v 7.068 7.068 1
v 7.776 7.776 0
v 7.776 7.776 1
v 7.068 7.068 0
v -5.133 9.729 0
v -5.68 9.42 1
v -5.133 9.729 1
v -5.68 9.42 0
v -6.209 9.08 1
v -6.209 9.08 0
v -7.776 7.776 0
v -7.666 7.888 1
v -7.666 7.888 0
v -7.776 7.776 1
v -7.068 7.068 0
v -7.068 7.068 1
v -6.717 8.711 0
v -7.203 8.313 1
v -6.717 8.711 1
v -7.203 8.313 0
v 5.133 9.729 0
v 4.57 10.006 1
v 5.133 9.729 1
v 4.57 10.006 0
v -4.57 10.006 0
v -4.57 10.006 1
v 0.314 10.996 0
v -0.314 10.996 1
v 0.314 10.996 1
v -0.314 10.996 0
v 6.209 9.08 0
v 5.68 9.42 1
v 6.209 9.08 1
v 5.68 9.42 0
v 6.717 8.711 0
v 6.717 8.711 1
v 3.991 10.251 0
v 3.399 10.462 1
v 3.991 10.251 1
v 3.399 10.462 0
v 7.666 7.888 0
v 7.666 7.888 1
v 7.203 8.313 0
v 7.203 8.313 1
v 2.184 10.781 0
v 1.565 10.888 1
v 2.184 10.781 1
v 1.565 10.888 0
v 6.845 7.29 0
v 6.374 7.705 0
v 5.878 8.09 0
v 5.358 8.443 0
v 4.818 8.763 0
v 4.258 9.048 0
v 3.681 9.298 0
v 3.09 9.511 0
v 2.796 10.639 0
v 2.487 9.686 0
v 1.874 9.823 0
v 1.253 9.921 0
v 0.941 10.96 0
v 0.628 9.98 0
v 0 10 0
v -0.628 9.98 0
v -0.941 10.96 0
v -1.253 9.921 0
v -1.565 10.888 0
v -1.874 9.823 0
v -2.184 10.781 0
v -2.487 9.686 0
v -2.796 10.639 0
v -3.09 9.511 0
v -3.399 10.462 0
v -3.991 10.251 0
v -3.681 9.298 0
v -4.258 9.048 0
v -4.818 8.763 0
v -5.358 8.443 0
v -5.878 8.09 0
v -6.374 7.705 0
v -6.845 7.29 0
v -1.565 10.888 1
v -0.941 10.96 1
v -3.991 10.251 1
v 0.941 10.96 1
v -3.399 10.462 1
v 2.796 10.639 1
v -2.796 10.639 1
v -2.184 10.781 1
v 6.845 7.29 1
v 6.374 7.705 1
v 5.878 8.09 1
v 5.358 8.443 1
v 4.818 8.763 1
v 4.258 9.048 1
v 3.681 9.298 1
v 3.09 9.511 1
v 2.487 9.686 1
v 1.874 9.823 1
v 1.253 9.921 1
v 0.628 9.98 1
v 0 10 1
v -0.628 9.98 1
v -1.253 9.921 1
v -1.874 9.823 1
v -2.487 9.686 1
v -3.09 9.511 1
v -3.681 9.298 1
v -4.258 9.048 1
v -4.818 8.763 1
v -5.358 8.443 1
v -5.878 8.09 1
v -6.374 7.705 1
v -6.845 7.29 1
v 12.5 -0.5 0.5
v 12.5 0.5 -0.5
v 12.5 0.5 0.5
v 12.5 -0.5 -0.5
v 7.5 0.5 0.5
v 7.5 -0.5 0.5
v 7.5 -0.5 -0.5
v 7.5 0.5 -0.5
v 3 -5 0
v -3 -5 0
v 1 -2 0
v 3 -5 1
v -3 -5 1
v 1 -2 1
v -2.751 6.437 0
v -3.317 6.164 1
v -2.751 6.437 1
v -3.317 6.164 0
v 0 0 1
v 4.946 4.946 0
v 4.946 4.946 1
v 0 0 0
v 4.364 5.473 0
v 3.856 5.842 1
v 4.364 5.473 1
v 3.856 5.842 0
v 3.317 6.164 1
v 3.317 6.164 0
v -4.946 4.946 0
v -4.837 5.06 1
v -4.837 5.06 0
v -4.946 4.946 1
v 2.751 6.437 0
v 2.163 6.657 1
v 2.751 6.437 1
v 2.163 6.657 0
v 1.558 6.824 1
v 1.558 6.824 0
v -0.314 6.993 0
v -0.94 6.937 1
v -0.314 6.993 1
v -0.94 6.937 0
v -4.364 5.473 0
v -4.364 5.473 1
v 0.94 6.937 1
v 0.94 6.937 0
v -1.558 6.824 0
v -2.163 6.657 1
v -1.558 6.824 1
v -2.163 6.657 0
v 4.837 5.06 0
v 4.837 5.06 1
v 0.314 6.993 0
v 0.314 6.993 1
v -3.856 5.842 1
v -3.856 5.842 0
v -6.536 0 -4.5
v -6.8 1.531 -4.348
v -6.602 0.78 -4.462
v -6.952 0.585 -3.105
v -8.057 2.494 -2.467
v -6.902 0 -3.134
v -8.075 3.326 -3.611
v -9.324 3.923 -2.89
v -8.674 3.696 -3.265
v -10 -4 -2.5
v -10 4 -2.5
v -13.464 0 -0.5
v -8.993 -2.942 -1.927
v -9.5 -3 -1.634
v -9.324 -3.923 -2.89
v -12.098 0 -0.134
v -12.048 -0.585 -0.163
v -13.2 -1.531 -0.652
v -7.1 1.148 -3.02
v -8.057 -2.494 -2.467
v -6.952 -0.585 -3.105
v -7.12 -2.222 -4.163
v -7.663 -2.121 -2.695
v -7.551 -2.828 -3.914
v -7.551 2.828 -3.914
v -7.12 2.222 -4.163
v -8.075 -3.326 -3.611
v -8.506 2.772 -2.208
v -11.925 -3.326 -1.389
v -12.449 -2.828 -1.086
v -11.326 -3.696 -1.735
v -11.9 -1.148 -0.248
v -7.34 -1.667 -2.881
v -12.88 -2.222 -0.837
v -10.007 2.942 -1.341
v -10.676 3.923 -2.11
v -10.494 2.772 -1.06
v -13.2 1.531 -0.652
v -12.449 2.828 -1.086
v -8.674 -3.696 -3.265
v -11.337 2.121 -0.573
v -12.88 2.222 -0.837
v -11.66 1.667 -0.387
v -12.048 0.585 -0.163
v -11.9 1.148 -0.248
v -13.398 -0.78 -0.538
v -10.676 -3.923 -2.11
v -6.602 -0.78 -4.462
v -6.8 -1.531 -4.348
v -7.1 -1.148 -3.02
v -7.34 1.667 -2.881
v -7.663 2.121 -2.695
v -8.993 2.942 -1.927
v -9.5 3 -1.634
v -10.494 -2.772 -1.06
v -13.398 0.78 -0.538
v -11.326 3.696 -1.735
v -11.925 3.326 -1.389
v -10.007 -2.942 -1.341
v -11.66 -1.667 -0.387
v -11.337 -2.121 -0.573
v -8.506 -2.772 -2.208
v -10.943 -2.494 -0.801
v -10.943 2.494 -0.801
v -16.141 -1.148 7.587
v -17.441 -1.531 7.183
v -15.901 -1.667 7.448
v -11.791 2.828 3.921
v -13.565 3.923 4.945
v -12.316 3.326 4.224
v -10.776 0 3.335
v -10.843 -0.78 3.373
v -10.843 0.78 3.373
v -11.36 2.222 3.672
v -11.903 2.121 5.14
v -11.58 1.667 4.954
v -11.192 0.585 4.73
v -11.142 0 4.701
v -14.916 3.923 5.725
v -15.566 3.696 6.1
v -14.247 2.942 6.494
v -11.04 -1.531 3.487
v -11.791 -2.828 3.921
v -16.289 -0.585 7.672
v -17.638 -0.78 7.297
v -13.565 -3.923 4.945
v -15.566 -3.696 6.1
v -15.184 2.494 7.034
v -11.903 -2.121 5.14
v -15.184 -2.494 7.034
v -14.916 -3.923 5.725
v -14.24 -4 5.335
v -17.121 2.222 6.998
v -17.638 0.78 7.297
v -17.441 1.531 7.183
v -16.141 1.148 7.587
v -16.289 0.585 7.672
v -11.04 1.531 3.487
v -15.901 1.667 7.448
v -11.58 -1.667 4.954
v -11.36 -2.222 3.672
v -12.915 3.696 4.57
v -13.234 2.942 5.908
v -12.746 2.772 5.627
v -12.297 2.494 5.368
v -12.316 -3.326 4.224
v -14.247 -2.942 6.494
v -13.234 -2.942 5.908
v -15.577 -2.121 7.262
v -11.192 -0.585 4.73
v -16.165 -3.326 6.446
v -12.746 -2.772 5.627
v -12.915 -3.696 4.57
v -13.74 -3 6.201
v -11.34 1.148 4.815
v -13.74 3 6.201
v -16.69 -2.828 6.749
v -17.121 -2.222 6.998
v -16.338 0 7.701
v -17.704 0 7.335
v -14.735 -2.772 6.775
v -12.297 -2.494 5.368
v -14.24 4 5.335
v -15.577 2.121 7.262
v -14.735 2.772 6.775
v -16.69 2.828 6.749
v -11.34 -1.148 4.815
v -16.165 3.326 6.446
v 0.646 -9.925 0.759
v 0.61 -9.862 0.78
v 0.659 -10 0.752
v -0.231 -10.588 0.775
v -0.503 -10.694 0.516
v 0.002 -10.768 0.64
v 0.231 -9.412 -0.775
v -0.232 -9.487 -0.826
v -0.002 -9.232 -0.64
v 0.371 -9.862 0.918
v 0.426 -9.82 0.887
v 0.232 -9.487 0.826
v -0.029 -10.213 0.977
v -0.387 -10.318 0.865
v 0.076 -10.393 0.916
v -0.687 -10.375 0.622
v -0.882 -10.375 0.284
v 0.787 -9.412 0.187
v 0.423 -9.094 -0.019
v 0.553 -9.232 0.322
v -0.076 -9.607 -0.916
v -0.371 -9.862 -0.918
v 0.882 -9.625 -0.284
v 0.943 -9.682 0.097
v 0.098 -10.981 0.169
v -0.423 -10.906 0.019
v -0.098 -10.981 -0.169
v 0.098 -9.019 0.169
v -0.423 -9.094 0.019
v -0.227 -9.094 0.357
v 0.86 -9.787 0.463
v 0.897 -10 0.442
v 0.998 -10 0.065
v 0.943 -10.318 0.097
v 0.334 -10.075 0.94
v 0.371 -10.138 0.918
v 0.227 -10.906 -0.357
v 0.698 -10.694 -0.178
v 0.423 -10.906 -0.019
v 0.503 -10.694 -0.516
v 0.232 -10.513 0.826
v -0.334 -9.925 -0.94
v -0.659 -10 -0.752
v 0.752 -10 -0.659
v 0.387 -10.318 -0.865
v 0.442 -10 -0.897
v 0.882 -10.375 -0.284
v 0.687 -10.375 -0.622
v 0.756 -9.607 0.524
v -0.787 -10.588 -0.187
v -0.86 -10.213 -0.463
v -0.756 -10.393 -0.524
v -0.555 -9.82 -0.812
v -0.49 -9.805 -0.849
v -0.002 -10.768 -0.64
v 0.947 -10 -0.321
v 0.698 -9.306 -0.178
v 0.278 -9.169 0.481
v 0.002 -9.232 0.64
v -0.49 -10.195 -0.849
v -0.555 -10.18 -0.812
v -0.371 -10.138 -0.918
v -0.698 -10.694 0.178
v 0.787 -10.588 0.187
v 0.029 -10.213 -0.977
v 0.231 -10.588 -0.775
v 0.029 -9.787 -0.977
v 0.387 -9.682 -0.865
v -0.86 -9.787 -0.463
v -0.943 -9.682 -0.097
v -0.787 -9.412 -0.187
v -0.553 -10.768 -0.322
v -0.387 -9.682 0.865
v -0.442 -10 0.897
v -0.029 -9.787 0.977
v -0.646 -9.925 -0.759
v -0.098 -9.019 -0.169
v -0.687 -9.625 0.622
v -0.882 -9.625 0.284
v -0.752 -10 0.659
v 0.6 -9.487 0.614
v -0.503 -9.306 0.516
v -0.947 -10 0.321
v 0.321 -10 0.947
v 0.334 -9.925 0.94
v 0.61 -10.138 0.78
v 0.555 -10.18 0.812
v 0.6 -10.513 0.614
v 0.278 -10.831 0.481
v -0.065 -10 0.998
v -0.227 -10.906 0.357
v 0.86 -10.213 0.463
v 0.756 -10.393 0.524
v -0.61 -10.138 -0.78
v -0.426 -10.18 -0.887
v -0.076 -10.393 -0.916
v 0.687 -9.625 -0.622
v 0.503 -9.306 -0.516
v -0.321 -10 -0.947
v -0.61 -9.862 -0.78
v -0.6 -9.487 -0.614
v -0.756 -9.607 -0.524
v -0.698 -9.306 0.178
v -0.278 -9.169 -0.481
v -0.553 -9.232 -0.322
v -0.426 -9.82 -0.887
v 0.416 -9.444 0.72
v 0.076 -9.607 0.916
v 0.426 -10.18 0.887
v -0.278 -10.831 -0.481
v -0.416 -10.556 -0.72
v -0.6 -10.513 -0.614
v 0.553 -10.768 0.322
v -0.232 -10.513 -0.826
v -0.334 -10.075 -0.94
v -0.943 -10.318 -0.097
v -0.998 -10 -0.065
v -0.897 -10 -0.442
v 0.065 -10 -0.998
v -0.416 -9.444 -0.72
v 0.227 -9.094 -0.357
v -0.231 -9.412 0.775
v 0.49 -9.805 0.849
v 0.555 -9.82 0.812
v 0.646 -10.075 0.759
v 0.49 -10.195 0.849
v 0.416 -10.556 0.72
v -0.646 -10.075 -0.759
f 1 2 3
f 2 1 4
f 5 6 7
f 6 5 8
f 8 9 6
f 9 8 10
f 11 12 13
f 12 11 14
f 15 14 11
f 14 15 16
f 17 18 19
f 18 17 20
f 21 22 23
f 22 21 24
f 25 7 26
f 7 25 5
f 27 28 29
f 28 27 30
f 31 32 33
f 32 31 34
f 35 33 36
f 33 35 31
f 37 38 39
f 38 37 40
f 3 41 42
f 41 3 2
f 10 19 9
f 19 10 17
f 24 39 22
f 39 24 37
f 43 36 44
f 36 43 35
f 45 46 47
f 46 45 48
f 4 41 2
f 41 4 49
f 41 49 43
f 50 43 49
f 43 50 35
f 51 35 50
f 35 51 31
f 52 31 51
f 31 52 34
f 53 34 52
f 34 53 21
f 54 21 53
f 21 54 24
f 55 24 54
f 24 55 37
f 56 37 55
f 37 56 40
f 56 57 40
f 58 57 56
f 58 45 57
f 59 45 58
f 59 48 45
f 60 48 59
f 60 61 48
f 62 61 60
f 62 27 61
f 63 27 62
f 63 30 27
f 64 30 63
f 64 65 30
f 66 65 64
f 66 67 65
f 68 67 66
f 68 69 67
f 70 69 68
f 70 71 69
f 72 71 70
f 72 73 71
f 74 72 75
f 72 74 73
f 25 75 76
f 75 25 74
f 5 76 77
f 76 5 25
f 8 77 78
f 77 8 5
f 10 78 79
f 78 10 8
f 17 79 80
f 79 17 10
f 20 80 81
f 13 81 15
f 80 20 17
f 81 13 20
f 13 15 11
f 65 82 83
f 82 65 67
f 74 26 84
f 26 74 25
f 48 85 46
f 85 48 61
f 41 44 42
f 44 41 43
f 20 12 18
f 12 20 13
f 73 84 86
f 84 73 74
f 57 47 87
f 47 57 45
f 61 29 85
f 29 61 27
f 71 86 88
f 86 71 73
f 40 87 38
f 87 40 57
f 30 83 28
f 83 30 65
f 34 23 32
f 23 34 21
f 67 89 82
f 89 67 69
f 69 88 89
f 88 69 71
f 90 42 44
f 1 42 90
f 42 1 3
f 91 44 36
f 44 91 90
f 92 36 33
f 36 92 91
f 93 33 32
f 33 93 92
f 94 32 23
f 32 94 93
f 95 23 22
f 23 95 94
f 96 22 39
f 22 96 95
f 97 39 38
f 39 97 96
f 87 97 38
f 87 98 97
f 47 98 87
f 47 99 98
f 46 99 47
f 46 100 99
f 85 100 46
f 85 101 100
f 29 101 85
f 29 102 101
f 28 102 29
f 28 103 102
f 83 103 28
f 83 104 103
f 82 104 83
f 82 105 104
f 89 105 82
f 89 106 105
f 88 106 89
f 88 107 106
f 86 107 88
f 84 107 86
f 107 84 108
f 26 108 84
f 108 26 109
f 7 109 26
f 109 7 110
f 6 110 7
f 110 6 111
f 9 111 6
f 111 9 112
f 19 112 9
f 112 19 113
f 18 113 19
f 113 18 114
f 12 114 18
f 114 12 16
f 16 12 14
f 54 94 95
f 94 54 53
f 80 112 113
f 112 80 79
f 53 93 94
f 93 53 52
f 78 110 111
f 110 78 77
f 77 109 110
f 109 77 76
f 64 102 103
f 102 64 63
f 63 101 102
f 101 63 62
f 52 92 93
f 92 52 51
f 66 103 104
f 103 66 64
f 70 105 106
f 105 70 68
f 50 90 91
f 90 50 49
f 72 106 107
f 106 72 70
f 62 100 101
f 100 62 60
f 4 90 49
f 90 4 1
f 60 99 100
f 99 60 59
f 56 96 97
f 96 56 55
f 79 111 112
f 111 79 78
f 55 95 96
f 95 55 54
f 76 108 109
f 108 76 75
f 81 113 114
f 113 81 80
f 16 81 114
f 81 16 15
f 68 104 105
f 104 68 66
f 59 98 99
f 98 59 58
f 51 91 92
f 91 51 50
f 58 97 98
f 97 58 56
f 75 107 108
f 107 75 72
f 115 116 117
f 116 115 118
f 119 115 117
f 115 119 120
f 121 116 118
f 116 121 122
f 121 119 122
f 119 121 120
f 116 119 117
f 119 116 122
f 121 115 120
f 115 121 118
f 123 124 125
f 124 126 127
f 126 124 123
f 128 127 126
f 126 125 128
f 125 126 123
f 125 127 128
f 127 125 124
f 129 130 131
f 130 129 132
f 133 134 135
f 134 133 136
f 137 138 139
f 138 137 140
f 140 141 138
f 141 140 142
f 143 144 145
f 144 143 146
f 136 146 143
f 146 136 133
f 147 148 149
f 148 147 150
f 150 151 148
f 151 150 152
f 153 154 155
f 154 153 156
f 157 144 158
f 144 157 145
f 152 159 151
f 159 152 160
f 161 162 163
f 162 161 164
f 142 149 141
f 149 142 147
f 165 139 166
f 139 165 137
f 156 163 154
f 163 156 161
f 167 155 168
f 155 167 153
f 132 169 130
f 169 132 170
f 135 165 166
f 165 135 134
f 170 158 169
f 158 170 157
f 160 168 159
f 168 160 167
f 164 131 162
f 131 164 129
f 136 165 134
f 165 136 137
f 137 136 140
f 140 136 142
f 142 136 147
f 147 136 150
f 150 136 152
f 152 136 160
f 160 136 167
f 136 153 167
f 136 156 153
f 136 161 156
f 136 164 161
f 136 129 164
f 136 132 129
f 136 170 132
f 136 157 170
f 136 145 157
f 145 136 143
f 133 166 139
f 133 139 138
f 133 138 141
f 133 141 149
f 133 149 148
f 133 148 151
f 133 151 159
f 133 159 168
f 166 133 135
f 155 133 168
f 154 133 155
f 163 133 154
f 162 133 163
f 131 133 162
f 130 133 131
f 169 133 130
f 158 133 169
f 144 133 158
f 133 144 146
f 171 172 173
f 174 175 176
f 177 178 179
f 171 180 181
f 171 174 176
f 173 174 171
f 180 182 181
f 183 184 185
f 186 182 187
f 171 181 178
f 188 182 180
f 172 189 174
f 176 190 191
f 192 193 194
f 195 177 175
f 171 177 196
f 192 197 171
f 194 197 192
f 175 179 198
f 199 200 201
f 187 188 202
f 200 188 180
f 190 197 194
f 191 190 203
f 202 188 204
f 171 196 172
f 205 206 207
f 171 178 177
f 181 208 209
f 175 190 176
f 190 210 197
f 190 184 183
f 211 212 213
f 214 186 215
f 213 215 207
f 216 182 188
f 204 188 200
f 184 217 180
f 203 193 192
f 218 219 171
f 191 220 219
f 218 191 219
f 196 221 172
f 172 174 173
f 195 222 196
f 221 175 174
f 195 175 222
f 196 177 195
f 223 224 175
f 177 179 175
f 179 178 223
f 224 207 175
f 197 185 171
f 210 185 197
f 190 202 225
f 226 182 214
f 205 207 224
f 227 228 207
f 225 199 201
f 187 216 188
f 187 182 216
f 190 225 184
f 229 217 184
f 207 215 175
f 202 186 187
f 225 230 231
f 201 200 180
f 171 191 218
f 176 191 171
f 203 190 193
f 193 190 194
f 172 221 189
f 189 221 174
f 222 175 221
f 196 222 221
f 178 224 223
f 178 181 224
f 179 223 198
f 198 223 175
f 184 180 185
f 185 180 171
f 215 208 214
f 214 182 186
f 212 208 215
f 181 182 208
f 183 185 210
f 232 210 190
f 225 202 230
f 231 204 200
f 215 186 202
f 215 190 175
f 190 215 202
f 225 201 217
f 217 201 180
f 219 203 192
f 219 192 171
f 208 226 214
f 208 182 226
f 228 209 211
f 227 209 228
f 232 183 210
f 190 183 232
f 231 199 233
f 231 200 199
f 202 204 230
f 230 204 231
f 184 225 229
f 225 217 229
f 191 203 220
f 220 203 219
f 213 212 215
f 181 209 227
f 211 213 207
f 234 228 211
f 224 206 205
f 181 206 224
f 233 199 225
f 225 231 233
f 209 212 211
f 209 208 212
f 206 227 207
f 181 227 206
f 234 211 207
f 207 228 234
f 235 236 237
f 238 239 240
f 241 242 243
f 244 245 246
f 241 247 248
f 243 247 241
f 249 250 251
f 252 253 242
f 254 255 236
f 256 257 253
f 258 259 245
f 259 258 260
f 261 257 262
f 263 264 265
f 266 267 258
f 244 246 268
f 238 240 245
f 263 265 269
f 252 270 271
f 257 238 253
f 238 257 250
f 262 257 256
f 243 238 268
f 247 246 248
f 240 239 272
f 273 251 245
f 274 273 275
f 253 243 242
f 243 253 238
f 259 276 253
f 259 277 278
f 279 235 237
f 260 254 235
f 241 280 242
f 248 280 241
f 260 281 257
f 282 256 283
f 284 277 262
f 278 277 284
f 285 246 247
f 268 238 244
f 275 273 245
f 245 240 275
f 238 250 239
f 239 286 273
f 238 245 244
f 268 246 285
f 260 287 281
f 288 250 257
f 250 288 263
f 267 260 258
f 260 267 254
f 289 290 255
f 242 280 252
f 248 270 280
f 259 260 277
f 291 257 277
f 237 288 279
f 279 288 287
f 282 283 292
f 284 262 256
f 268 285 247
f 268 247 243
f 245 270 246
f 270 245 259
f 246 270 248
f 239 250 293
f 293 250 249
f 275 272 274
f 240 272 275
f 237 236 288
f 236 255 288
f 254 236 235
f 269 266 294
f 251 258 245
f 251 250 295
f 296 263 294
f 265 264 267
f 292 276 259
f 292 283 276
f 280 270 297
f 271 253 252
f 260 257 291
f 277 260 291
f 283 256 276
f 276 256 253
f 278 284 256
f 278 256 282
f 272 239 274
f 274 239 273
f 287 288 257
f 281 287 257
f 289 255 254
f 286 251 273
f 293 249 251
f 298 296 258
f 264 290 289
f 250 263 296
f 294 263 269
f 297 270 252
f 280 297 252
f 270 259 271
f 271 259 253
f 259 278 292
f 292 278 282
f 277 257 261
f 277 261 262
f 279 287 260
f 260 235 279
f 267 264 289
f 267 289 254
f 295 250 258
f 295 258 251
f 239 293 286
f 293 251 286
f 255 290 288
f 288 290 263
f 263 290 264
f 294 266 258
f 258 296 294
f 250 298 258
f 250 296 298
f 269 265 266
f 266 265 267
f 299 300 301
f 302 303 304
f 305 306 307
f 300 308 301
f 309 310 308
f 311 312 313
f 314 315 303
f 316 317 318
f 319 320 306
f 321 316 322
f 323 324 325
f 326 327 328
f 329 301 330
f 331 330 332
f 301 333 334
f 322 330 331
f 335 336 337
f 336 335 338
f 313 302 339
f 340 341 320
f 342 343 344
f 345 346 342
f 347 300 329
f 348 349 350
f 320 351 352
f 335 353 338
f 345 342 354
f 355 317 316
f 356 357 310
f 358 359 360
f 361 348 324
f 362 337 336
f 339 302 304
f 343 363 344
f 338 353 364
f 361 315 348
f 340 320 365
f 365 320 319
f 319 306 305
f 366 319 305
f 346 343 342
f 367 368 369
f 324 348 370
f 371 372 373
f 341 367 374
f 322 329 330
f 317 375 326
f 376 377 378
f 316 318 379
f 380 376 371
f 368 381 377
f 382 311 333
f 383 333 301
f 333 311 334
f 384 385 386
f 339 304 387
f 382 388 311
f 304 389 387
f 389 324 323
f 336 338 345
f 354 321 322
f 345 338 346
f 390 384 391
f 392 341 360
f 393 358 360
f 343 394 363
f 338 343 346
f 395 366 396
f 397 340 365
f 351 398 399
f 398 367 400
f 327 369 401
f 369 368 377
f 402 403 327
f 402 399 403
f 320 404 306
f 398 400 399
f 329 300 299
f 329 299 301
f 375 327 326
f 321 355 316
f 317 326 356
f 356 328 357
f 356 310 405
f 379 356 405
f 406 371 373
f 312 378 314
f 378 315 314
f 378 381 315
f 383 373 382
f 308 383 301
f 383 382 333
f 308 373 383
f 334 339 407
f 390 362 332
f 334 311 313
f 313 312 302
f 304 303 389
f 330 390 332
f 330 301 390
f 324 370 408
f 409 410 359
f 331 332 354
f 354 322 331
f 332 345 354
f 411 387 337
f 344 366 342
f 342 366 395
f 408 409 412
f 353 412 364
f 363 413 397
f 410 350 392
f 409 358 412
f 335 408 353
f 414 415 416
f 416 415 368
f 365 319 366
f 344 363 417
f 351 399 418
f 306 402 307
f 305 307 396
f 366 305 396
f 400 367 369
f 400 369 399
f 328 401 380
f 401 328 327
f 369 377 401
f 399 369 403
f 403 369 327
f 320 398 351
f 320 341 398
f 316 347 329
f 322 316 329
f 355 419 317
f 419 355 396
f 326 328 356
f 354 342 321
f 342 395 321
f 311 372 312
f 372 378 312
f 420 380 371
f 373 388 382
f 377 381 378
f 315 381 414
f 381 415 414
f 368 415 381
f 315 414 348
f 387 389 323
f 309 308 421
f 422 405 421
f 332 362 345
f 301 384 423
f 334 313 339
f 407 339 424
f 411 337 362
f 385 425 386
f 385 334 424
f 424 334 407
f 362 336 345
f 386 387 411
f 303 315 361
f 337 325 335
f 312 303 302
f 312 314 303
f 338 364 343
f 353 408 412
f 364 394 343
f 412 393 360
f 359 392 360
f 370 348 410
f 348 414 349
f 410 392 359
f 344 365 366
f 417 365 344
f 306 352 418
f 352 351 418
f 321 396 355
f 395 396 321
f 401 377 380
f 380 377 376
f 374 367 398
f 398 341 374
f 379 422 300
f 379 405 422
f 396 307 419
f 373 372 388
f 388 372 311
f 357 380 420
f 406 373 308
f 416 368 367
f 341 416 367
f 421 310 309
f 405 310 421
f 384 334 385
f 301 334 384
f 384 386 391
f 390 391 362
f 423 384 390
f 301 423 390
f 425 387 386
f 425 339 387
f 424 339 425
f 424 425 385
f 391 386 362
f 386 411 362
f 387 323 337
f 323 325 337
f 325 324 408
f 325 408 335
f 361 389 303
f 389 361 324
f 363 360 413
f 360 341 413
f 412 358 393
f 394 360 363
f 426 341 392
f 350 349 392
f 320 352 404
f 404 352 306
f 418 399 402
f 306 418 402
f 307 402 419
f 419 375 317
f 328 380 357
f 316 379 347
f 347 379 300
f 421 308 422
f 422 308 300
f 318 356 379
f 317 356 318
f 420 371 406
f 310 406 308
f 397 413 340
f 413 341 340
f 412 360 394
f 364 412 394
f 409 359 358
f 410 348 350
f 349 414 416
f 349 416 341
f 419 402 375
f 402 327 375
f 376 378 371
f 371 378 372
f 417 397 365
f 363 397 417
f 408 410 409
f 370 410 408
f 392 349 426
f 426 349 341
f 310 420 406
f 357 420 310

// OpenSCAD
// file: ../scad/basic.scad
//yCube(szx=5, py=3, rz=30, mx=1, clr="red");
//yCyl(px=7, py=5, rb=3, clr="green");
//yPoly(p=[[-5,0],[5,0],[0,5]],szz=3);
//ySec(r=5);
//yArc(r=15, px=5);

//px - Position X
//rx - Rotation X
//sx - Scale X
//mx - Mirror X
//szx - SiZe X
module yVersion(){
    echo("\n\n\t version: 0.1.1.20200211\n\n");
}
module yCube(px=0, py=0, pz=0, rx=0, ry=0, rz=0, sx=1, sy=1, sz=1, mx=0, my=0, mz=0, szx=1, szy=1, szz=1, clr = "grey") {
    mirror([mx,my,mz])
    translate([px, py, pz])
    rotate([rx,ry,rz])
    scale([sx,sy,sz])
    color(clr)
        cube([szx, szy, szz], center=true);    
}//yCube

module ySphere(px=0, py=0, pz=0, rx=0, ry=0, rz=0, sx=1, sy=1, sz=1, mx=0, my=0, mz=0, r=1, clr = "grey", fn = ($preview ? 4:8)) {
    mirror([mx,my,mz])
    translate([px, py, pz])
    rotate([rx,ry,rz])
    scale([sx,sy,sz])
    color(clr)
        sphere( r, $fn=fn*((r>2)?r:2));    
}//yCube

//rb - Radius Bottom, 
//rt - Radius Top
module yCyl(px=0, py=0, pz=0, rx=0, ry=0, rz=0, sx=1, sy=1, sz=1, mx=0, my=0, mz=0, rb=1, rt=1, szz=1, clr = "grey", fn = ($preview ? 2:8) ) {
    mirror([mx,my,mz])
    translate([px, py, (pz-szz/2)])
    rotate([rx,ry,rz])
    scale([sx,sy,sz])
    color(clr)
        cylinder(szz, rb, rt, $fn=fn*((rb>rt)?rb:rt));    
}//yCyl

module yCyl2(px=0, py=0, pz=0, rx=0, ry=0, rz=0, sx=1, sy=1, sz=1, mx=0, my=0, mz=0, rb=1, rt=1, szz=1, clr = "grey", fn = ($preview ? 2:8) ) {
    mirror([mx,my,mz])
    rotate([rx,ry,rz])
    translate([px, py, (pz-szz/2)])
    scale([sx,sy,sz])
    color(clr)
        cylinder(szz, rb, rt, $fn=fn*((rb>rt)?rb:rt));    
}//yCyl2

//p = [[x0,y0], [x1,y1], [x2,y2]]
module yPoly(px=0, py=0, pz=0, rx=0, ry=0, rz=0, sx=1, sy=1, sz=1, mx=0, my=0, mz=0, p=[[0,0],[10,0],[0,10]], szz=1, clr = "grey") {
    mirror([mx,my,mz])
    translate([px, py, pz])
    rotate([rx,ry,rz])
    scale([sx,sy,sz])
    color(clr)
        linear_extrude(szz)
            polygon(p);
}//yCube

//https://openhome.cc/eGossip/OpenSCAD/SectorArc.html
module ySec(r=5, a=[45,135], szz=1, fn=($preview ? 3:10), px=0, py=0, pz=0, rx=0, ry=0, rz=0, sx=1, sy=1, sz=1, mx=0, my=0, mz=0, clr = "grey") {
    _r = r / cos(180 / fn);
    step = -360 / fn;

    points = concat([[0, 0]],
        [for(_a = [a[0] : step : a[1] - 360]) 
            [_r * cos(_a), _r * sin(_a)]
        ],
        [[_r * cos(a[1]), _r * sin(a[1])]]
    );

    mirror([mx,my,mz])
    translate([px, py, pz])
    rotate([rx,ry,rz])
    scale([sx,sy,sz])
    color(clr)
        linear_extrude(szz)
            difference() {
                circle(r, $fn = r*fn);
                polygon(points);
            }//diff
}//module ySec

module yArc(r=5, a=[45,135], w=1, szz=1, fn=($preview ? 3:10), px=0, py=0, pz=0, rx=0, ry=0, rz=0, sx=1, sy=1, sz=1, mx=0, my=0, mz=0, clr = "grey"){
    mirror([mx,my,mz])
    translate([px, py, pz])
    rotate([rx,ry,rz])
    scale([sx,sy,sz])
    color(clr)
        difference(){
            ySec(r=r+w, a=a, szz=szz, fn=fn);
            ySec(r=(r), a=a, szz=(szz+2), pz=-1, fn=fn);
        }//diff
}
// main file
include <../scad/basic.scad>

yVersion();

yCube(szx=5, px=10);
yPoly(p=[[-3,0], [3,0], [1,3]], py=-5);
ySec(r=7);
yArc(r=10);
yCyl(rb=4, rt=3, px=-10, pz=-2, ry=30);
yCyl2(rb=4, rt=3, px=-15, pz=-2, ry=30);
ySphere(r=1, py=-10, ry=30);

//longeron();
//gun();

//test modules
module gun(){
    difference(){
        union(){
            yCyl(szz=15, rb=7, rt=6, pz=7.5);
            yCyl(szz=22, rb=5, rt=5, pz=11);
        }//union
        yCyl(szz=32, rb=3, rt=3, pz=16);        
    }//diff
    yCube(szx=6, szy=0.45, szz=6, px=8, pz=3);
    yCube(szx=12, szy=12, szz=0.4, px=14, pz=0.2);
    
    yCube(szx=8, szy=0.45, szz=6, px=-8, pz=3);
    yCube(szx=12, szy=12, szz=0.4, px=-14, pz=0.2);
    
    yCube(szx=0.45, szy=6, szz=6, py=8, pz=3);
    yCube(szx=12, szy=12, szz=0.4, py=14, pz=0.2);
    
    yCube(szx=0.45, szy=6, szz=6, py=-8, pz=3);
    yCube(szx=12, szy=12, szz=0.4, py=-14, pz=0.2);
}//module gun
    
module longeron(){
    yCube(szx=100, szy=0.85, szz=0.5);
    yCube(szx=100, szy=0.85, szz=0.55, pz=3);

    yCube(szx=2, szy=0.85, szz=3, px=-50, pz=1.5);
    yCube(szx=2, szy=0.85, szz=3, px=-45, pz=1.5);
    yCube(szx=2, szy=0.85, szz=3, px=-35, pz=1.5);
    yCube(szx=2, szy=0.85, szz=3, px=-20, pz=1.5);
    yCube(szx=2, szy=0.85, szz=3, px=5, pz=1.5);
    yCube(szx=2, szy=0.85, szz=3, px=35, pz=1.5);
    yCube(szx=2, szy=0.85, szz=3, px=50, pz=1.5);
}//module longeron
